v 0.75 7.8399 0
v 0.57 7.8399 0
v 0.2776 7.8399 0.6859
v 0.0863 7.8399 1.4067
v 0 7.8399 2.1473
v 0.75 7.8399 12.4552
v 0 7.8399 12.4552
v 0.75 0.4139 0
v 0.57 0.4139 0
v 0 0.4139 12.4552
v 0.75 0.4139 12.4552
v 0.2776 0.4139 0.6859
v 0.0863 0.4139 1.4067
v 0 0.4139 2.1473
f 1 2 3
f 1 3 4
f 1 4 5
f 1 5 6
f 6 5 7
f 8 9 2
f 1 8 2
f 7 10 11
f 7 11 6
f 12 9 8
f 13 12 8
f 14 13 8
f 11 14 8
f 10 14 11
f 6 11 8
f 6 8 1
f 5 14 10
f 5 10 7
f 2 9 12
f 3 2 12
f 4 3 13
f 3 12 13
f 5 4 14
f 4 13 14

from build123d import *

# Parameters (mm, degrees)
F0_W     = 7.426
F0_H     = 12.45523
F1_DEPTH = 0.75
F3_DEPTH = 7.427


with BuildPart() as f1:
    # F0 (on Right) → F1 (new body)
    with BuildSketch(Plane.YZ):
        with Locations((4.126913, 6.227615)):
            Rectangle(F0_W, F0_H)
    extrude(amount=F1_DEPTH)

    # F2 (on face) → F3 (cut, through all)
    with BuildSketch(Plane.XZ.offset(-0.413913)):
        with BuildLine():
            ThreePointArc((0.57, 0), (0.168979, 1.042876), (0, 2.147347))
            Line((0, 2.147347), (0, 0))
            Line((0, 0), (0.57, 0))
        make_face()
    extrude(amount=-F3_DEPTH, mode=Mode.SUBTRACT)


solid = f1.part
